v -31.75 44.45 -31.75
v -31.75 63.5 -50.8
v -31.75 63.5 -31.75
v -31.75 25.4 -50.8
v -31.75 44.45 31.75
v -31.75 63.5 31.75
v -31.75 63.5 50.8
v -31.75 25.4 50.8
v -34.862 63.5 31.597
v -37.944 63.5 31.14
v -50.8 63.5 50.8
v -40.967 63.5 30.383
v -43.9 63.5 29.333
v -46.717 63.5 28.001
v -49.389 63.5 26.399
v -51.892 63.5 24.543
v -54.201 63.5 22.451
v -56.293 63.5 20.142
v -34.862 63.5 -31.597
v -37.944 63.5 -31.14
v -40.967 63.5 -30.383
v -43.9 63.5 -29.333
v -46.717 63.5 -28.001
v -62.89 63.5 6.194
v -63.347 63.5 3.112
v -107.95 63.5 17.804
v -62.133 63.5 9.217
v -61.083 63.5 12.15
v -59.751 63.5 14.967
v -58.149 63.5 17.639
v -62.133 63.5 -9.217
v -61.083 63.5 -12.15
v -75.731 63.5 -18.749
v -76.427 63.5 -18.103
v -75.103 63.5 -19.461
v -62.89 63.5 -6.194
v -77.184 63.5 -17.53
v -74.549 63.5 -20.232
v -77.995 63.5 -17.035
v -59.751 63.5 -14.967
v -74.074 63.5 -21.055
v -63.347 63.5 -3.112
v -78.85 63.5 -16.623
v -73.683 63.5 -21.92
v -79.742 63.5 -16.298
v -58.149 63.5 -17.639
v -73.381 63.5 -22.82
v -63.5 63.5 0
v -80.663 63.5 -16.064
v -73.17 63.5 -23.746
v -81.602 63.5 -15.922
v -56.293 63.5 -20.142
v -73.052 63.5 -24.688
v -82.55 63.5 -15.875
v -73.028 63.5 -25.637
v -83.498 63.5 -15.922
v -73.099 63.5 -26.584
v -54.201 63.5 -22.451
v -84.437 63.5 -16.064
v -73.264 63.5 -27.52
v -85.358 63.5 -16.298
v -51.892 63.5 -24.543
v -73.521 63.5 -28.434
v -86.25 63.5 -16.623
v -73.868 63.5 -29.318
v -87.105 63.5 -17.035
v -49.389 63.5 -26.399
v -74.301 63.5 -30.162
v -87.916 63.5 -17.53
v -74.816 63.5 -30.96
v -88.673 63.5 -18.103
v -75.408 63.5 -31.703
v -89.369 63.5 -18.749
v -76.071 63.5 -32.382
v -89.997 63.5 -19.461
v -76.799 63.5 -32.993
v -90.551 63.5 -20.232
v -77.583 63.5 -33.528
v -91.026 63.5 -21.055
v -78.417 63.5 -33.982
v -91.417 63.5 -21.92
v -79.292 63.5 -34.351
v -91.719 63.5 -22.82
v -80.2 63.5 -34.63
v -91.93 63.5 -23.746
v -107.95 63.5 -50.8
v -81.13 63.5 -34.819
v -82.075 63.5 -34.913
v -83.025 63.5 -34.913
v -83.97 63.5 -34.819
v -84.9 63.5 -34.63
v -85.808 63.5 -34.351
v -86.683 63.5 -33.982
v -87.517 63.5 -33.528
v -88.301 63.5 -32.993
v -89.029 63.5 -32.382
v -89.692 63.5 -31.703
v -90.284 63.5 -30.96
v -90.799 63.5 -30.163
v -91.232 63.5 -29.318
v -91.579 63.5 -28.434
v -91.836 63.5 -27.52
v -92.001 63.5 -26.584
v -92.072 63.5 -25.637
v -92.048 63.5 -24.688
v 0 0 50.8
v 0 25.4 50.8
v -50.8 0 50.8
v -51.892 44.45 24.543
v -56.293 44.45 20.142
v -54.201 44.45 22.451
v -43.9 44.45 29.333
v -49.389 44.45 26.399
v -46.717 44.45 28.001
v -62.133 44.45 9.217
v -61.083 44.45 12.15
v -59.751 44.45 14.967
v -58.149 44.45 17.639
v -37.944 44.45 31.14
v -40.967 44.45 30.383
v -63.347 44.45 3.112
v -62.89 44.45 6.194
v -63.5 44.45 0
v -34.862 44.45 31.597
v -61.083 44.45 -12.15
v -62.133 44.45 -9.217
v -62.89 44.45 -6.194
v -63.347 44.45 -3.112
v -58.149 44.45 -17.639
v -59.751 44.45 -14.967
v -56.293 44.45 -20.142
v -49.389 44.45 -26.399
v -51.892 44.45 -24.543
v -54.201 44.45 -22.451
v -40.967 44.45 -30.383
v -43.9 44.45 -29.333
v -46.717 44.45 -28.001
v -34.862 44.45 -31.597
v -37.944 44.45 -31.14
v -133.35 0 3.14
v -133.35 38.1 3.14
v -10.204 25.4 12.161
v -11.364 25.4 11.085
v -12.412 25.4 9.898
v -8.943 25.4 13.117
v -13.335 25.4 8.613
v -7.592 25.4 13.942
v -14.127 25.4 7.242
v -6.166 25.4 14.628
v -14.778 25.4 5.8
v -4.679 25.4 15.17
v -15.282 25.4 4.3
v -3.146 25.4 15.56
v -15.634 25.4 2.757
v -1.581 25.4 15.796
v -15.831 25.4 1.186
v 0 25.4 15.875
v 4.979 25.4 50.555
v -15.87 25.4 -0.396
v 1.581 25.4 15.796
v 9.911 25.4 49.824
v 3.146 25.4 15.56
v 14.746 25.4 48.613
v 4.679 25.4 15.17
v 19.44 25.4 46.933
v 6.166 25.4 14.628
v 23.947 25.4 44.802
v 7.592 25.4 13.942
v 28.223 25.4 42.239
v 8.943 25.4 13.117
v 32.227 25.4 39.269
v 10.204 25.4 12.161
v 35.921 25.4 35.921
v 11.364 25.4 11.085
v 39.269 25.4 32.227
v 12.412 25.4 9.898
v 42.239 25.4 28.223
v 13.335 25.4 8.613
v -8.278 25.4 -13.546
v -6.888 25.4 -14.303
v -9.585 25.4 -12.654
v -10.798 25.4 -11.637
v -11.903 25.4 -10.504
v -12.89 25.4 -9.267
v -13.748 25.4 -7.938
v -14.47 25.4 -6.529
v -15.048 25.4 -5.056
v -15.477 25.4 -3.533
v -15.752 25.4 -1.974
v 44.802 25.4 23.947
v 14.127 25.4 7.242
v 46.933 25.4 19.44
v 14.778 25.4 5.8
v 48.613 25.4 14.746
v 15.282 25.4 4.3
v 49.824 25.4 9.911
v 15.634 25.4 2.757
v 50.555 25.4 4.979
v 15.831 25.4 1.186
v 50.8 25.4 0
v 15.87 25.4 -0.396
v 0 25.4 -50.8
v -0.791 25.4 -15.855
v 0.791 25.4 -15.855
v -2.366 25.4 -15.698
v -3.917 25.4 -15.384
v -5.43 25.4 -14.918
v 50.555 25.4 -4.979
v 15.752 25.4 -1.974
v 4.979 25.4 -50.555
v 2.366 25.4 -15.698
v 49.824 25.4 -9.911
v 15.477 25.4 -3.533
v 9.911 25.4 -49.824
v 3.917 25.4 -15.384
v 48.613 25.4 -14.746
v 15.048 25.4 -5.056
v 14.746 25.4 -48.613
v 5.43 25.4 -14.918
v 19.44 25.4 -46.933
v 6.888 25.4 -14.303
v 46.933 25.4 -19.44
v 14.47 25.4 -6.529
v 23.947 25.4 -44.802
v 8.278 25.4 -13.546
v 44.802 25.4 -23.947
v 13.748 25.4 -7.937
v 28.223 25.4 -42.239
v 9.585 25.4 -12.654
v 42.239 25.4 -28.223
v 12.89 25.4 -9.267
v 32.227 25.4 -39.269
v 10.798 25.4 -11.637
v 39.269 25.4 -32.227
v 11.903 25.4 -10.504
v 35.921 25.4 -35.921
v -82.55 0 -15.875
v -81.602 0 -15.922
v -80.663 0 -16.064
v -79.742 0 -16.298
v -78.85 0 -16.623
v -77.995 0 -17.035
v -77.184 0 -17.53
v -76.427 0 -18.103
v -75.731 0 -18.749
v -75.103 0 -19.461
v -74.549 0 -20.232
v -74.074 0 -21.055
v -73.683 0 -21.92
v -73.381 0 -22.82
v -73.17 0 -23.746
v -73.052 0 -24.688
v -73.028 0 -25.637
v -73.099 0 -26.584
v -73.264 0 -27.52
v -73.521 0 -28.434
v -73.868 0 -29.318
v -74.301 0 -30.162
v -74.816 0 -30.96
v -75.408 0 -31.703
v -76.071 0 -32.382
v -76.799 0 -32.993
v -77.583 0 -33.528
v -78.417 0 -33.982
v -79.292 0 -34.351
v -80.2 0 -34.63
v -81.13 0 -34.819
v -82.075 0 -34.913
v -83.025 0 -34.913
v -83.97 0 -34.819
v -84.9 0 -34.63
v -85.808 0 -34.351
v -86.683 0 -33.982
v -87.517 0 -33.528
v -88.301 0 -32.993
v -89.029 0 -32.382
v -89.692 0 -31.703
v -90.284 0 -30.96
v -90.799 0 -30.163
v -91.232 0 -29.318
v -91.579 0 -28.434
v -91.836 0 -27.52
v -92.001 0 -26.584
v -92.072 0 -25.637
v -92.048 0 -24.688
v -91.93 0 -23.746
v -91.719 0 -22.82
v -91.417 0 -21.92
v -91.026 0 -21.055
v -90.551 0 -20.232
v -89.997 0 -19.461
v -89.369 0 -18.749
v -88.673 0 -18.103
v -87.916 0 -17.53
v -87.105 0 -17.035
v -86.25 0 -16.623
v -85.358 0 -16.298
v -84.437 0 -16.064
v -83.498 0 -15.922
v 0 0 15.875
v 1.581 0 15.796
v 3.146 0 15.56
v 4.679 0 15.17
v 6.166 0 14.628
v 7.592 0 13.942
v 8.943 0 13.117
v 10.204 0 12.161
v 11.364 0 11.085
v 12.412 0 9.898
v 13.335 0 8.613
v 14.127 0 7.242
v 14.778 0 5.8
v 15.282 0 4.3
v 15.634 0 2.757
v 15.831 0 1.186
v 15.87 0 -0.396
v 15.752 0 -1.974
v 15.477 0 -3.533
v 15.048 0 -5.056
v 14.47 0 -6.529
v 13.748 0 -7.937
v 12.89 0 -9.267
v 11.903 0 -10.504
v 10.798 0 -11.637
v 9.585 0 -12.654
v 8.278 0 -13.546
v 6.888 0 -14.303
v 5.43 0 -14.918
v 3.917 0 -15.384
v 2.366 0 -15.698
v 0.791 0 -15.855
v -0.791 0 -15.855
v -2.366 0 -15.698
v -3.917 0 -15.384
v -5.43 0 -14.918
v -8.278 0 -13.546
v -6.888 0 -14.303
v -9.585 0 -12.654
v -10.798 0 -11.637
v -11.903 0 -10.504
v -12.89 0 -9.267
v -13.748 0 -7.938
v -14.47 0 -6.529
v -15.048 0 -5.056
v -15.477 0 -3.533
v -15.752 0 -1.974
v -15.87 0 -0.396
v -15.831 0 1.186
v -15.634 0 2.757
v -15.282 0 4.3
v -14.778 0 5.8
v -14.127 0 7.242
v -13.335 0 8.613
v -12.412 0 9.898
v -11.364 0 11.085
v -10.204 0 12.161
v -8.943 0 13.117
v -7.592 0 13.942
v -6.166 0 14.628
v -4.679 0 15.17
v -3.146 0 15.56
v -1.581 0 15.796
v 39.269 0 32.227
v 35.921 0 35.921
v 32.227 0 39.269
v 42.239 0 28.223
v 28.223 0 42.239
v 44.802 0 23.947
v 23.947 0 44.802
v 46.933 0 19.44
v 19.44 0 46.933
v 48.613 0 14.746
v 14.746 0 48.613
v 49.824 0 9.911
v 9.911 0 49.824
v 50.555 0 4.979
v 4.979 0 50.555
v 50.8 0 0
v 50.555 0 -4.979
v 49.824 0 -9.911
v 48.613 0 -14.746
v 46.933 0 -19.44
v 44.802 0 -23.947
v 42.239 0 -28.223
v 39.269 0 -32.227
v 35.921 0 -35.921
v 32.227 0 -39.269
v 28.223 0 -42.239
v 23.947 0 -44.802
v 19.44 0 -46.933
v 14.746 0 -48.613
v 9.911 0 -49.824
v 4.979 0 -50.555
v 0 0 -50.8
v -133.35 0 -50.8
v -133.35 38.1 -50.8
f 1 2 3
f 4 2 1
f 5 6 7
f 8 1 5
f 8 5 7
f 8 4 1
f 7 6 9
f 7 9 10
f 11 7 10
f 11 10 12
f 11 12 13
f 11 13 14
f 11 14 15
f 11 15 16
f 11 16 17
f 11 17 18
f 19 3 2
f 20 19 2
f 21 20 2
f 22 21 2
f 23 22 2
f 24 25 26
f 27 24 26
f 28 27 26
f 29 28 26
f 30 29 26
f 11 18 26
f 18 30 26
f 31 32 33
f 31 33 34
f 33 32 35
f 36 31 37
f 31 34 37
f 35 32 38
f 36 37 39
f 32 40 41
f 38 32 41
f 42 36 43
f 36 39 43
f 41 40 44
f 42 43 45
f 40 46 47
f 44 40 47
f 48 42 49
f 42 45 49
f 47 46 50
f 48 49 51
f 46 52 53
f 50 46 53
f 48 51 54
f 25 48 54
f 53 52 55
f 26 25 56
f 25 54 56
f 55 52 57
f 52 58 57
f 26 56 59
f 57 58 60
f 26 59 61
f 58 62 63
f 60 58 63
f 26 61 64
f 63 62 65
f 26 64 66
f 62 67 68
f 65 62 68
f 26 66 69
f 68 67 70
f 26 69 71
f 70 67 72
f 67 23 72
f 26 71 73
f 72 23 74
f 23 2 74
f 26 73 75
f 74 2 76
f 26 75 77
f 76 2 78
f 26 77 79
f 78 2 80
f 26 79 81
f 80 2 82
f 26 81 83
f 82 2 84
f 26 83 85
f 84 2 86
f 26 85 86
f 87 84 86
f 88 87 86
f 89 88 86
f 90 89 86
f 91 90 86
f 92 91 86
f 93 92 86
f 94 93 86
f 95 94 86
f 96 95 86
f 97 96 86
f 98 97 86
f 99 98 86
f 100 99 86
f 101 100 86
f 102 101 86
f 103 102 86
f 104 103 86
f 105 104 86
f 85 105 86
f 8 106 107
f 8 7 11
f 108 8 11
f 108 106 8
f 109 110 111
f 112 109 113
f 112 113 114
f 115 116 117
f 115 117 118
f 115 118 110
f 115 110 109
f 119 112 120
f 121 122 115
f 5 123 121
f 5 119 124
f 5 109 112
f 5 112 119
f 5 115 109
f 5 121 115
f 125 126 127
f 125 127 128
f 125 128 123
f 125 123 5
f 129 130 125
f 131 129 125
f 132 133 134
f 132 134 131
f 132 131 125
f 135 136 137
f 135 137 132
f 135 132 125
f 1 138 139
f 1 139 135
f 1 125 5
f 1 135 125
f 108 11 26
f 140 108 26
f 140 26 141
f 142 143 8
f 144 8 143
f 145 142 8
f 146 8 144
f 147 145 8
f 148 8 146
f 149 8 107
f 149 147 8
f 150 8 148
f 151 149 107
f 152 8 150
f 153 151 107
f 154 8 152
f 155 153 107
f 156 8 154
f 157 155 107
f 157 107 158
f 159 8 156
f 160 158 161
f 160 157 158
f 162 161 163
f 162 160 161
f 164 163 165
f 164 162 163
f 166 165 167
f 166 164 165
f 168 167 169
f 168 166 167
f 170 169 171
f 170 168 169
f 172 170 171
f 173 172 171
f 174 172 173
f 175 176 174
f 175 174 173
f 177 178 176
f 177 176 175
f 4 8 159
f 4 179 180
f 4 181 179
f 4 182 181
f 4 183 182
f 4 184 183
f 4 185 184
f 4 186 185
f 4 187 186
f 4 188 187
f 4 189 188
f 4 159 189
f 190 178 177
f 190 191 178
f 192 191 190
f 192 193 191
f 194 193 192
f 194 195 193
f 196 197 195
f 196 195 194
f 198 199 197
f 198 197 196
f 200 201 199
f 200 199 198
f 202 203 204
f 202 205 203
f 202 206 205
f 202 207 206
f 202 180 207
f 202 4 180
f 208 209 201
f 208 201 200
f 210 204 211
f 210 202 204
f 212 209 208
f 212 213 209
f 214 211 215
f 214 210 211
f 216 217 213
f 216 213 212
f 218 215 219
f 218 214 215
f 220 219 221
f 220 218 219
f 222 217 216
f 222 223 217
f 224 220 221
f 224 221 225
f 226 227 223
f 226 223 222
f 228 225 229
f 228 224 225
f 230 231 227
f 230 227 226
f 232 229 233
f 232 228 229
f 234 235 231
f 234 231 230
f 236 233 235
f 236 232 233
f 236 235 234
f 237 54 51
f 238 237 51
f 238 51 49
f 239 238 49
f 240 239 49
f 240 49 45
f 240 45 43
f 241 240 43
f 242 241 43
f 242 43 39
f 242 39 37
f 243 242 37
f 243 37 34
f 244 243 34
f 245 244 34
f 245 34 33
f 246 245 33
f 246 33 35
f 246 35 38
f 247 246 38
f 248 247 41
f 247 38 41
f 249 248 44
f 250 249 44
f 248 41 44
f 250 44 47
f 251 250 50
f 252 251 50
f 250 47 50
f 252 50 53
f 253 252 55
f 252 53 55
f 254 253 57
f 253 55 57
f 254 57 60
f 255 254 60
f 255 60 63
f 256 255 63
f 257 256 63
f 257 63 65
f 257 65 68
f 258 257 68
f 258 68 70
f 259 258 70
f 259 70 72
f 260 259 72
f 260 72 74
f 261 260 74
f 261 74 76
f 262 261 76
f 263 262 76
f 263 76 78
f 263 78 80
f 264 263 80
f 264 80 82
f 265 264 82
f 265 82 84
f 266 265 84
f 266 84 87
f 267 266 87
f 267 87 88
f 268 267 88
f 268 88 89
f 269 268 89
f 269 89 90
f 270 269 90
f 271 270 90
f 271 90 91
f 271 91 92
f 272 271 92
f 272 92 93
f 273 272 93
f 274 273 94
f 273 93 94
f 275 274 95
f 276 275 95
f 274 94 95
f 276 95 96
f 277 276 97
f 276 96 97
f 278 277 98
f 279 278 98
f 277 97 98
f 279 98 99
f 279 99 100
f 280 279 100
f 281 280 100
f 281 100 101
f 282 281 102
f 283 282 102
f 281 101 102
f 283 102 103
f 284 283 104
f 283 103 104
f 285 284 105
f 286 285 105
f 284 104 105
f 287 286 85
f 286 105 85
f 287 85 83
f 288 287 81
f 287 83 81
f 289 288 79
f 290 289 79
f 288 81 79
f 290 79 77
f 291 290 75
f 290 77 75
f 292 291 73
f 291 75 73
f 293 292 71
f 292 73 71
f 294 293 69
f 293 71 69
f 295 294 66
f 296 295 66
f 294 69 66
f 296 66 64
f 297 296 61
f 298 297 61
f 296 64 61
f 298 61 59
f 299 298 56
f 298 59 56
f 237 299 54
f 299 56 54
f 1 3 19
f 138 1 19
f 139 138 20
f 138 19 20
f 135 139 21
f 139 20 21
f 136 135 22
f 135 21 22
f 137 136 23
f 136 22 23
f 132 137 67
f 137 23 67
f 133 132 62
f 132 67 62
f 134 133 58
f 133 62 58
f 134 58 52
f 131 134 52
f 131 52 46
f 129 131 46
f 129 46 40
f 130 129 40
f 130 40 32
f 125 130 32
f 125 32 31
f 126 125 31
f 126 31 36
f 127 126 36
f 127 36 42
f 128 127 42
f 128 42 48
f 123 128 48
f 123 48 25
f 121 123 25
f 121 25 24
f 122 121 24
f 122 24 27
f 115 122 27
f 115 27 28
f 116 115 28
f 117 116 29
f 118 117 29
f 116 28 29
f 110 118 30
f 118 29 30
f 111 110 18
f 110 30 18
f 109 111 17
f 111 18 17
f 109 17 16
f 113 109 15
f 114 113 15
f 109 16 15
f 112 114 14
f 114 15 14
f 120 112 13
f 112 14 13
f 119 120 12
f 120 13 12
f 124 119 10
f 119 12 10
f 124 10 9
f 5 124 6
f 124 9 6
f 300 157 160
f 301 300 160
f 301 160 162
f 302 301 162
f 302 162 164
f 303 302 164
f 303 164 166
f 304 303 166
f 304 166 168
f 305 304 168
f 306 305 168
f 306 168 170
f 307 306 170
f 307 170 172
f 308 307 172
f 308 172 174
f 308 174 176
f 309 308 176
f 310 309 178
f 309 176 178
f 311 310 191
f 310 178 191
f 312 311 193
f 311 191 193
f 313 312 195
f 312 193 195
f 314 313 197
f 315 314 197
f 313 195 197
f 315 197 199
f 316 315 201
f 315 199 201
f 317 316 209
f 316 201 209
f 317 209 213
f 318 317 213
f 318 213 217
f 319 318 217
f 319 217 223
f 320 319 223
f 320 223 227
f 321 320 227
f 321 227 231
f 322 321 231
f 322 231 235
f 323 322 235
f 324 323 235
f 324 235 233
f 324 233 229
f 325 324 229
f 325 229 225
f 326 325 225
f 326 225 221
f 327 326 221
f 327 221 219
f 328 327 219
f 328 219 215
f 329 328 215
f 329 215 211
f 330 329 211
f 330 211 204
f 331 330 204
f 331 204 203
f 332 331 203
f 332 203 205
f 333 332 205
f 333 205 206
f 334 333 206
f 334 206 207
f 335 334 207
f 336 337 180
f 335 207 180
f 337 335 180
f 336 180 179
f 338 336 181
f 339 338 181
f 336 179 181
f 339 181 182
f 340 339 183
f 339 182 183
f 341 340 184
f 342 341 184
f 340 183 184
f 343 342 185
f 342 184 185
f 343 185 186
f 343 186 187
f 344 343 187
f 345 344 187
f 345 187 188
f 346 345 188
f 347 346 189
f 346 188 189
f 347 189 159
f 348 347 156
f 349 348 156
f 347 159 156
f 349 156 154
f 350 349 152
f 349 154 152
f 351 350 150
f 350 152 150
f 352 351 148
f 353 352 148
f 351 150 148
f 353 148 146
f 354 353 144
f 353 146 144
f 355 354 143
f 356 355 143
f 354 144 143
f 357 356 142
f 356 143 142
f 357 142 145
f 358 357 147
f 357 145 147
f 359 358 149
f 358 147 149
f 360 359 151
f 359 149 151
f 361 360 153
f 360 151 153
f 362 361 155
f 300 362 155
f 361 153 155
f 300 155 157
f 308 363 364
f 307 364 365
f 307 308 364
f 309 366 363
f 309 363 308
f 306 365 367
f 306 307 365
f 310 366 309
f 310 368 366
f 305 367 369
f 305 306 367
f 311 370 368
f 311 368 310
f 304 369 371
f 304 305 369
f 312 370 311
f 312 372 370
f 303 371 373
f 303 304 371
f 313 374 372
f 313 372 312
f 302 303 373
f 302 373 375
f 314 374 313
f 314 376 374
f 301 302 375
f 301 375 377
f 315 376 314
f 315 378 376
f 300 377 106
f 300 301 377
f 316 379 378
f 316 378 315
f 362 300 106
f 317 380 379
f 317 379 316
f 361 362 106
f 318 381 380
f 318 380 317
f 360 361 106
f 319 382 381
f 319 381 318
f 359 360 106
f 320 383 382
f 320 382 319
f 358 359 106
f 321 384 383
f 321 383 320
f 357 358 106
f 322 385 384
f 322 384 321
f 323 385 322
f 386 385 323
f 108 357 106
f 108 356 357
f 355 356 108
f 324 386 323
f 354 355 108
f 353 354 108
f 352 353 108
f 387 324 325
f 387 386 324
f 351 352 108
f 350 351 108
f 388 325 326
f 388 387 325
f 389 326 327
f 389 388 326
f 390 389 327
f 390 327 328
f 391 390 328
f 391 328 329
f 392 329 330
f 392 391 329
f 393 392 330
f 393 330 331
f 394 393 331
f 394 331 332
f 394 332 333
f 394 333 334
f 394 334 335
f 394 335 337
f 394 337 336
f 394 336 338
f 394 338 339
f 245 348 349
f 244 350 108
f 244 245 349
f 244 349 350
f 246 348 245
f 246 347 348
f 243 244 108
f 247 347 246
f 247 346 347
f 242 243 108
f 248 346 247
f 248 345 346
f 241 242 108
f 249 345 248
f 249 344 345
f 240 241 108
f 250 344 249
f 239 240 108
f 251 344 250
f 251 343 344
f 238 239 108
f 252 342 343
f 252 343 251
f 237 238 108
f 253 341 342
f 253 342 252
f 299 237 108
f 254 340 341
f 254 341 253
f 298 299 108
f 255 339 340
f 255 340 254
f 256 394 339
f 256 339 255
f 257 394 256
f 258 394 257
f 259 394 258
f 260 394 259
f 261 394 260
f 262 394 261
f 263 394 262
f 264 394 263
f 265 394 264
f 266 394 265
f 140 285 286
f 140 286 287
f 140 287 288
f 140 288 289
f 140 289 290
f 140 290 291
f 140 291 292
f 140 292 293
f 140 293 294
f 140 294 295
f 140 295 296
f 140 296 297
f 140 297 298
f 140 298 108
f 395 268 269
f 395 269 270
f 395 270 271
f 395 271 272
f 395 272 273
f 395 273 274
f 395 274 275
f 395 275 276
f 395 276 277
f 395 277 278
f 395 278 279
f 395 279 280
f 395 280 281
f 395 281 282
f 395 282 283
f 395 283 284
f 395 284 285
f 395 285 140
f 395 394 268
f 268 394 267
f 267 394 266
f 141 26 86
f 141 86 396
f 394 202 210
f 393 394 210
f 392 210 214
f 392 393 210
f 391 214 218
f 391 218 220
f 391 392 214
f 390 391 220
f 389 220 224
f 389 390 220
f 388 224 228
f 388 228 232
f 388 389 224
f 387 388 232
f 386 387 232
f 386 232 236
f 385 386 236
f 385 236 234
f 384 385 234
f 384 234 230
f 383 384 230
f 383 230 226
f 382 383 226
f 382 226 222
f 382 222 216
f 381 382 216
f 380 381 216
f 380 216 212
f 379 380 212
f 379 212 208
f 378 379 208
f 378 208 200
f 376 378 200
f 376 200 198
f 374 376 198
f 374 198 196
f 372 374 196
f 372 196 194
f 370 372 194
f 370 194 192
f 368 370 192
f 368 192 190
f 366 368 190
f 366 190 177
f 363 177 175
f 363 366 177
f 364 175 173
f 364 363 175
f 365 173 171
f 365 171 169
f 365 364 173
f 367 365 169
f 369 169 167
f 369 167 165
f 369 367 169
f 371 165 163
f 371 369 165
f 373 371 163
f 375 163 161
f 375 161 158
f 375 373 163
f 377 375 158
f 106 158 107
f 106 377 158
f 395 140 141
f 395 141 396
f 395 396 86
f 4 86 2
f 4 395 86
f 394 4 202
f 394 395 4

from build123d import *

# Parameters (mm, degrees)
BOSS_EXTRUDE1_DEPTH     = 63.5
CUT_EXTRUDE1_DEPTH      = 157.189348228
CUT_EXTRUDE1_DEPTH_BACK = 38.1
CUT_EXTRUDE2_DEPTH      = 157.189348228
CUT_EXTRUDE3_DEPTH      = 180.268046511
SKETCH5_R               = 31.75
CUT_EXTRUDE4_DEPTH      = 19.05
SKETCH6_R               = 9.525
CUT_EXTRUDE5_DEPTH      = 157.189348228
SKETCH7_R               = 15.875
CUT_EXTRUDE6_DEPTH      = 148.69723254


with BuildPart() as part:
    # Sketch1 → Boss-Extrude1 (new body)
    with BuildSketch(Plane(origin=(0, 0, 0), x_dir=(1, 0, 0), z_dir=(0, 1, 0))):
        with BuildLine():
            Line((0, -50.8), (-133.35, -50.8))
            Line((-133.35, -50.8), (-133.35, 50.8))
            Line((-133.35, 50.8), (0, 50.8))
            ThreePointArc((0, 50.8), (50.8, 0), (0, -50.8))
        make_face()
    extrude(amount=BOSS_EXTRUDE1_DEPTH)

    # Sketch2 → Cut-Extrude1 (cut, two sides: drawn at the far end of the back side and taken through both)
    with BuildSketch(Plane(origin=(0, 63.5, 0), x_dir=(1, 0, 0), z_dir=(0, 1, 0)).offset(-CUT_EXTRUDE1_DEPTH_BACK)):
        Polygon((-31.75, 348.168195874), (-31.75, 50.8), (-31.75, -50.8), (-31.75, -348.168195874), (562.986391748, -348.168195874), (562.986391748, 348.168195874), align=None)
    extrude(amount=CUT_EXTRUDE1_DEPTH + CUT_EXTRUDE1_DEPTH_BACK, mode=Mode.SUBTRACT)

    # Sketch3 → Cut-Extrude2 (cut, through all)
    with BuildSketch(Plane(origin=(0, 63.5, 0), x_dir=(1, 0, 0), z_dir=(0, 1, 0))):
        Polygon((-133.35, -50.8), (-50.8, -50.8), (-133.35, -3.139735278), align=None)
    extrude(amount=-CUT_EXTRUDE2_DEPTH, mode=Mode.SUBTRACT)

    # Sketch4 → Cut-Extrude3 (cut, through all)
    with BuildSketch(Plane(origin=(0, 0, -50.8), x_dir=(-1, 0, 0), z_dir=(0, 0, -1))):
        Polygon((133.35, 63.5), (107.95, 63.5), (133.35, 38.1), align=None)
    extrude(amount=-CUT_EXTRUDE3_DEPTH, mode=Mode.SUBTRACT)

    # Sketch5 → Cut-Extrude4 (cut)
    with BuildSketch(Plane(origin=(0, 63.5, 0), x_dir=(1, 0, 0), z_dir=(0, 1, 0))):
        with Locations((-31.75, 0)):
            Circle(SKETCH5_R)
    extrude(amount=-CUT_EXTRUDE4_DEPTH, mode=Mode.SUBTRACT)

    # Sketch6 → Cut-Extrude5 (cut, through all)
    with BuildSketch(Plane(origin=(0, 63.5, 0), x_dir=(1, 0, 0), z_dir=(0, 1, 0))):
        with Locations(Location((-82.55, 25.4, 0), (0, 0, 270))):
            Circle(SKETCH6_R)
    extrude(amount=-CUT_EXTRUDE5_DEPTH, mode=Mode.SUBTRACT)

    # Sketch7 → Cut-Extrude6 (cut, through all)
    with BuildSketch(Plane(origin=(0, 25.4, 0), x_dir=(1, 0, 0), z_dir=(0, 1, 0))):
        with Locations(Location((0, 0, 0), (0, 0, 270))):
            Circle(SKETCH7_R)
    extrude(amount=-CUT_EXTRUDE6_DEPTH, mode=Mode.SUBTRACT)


solid = part.part
